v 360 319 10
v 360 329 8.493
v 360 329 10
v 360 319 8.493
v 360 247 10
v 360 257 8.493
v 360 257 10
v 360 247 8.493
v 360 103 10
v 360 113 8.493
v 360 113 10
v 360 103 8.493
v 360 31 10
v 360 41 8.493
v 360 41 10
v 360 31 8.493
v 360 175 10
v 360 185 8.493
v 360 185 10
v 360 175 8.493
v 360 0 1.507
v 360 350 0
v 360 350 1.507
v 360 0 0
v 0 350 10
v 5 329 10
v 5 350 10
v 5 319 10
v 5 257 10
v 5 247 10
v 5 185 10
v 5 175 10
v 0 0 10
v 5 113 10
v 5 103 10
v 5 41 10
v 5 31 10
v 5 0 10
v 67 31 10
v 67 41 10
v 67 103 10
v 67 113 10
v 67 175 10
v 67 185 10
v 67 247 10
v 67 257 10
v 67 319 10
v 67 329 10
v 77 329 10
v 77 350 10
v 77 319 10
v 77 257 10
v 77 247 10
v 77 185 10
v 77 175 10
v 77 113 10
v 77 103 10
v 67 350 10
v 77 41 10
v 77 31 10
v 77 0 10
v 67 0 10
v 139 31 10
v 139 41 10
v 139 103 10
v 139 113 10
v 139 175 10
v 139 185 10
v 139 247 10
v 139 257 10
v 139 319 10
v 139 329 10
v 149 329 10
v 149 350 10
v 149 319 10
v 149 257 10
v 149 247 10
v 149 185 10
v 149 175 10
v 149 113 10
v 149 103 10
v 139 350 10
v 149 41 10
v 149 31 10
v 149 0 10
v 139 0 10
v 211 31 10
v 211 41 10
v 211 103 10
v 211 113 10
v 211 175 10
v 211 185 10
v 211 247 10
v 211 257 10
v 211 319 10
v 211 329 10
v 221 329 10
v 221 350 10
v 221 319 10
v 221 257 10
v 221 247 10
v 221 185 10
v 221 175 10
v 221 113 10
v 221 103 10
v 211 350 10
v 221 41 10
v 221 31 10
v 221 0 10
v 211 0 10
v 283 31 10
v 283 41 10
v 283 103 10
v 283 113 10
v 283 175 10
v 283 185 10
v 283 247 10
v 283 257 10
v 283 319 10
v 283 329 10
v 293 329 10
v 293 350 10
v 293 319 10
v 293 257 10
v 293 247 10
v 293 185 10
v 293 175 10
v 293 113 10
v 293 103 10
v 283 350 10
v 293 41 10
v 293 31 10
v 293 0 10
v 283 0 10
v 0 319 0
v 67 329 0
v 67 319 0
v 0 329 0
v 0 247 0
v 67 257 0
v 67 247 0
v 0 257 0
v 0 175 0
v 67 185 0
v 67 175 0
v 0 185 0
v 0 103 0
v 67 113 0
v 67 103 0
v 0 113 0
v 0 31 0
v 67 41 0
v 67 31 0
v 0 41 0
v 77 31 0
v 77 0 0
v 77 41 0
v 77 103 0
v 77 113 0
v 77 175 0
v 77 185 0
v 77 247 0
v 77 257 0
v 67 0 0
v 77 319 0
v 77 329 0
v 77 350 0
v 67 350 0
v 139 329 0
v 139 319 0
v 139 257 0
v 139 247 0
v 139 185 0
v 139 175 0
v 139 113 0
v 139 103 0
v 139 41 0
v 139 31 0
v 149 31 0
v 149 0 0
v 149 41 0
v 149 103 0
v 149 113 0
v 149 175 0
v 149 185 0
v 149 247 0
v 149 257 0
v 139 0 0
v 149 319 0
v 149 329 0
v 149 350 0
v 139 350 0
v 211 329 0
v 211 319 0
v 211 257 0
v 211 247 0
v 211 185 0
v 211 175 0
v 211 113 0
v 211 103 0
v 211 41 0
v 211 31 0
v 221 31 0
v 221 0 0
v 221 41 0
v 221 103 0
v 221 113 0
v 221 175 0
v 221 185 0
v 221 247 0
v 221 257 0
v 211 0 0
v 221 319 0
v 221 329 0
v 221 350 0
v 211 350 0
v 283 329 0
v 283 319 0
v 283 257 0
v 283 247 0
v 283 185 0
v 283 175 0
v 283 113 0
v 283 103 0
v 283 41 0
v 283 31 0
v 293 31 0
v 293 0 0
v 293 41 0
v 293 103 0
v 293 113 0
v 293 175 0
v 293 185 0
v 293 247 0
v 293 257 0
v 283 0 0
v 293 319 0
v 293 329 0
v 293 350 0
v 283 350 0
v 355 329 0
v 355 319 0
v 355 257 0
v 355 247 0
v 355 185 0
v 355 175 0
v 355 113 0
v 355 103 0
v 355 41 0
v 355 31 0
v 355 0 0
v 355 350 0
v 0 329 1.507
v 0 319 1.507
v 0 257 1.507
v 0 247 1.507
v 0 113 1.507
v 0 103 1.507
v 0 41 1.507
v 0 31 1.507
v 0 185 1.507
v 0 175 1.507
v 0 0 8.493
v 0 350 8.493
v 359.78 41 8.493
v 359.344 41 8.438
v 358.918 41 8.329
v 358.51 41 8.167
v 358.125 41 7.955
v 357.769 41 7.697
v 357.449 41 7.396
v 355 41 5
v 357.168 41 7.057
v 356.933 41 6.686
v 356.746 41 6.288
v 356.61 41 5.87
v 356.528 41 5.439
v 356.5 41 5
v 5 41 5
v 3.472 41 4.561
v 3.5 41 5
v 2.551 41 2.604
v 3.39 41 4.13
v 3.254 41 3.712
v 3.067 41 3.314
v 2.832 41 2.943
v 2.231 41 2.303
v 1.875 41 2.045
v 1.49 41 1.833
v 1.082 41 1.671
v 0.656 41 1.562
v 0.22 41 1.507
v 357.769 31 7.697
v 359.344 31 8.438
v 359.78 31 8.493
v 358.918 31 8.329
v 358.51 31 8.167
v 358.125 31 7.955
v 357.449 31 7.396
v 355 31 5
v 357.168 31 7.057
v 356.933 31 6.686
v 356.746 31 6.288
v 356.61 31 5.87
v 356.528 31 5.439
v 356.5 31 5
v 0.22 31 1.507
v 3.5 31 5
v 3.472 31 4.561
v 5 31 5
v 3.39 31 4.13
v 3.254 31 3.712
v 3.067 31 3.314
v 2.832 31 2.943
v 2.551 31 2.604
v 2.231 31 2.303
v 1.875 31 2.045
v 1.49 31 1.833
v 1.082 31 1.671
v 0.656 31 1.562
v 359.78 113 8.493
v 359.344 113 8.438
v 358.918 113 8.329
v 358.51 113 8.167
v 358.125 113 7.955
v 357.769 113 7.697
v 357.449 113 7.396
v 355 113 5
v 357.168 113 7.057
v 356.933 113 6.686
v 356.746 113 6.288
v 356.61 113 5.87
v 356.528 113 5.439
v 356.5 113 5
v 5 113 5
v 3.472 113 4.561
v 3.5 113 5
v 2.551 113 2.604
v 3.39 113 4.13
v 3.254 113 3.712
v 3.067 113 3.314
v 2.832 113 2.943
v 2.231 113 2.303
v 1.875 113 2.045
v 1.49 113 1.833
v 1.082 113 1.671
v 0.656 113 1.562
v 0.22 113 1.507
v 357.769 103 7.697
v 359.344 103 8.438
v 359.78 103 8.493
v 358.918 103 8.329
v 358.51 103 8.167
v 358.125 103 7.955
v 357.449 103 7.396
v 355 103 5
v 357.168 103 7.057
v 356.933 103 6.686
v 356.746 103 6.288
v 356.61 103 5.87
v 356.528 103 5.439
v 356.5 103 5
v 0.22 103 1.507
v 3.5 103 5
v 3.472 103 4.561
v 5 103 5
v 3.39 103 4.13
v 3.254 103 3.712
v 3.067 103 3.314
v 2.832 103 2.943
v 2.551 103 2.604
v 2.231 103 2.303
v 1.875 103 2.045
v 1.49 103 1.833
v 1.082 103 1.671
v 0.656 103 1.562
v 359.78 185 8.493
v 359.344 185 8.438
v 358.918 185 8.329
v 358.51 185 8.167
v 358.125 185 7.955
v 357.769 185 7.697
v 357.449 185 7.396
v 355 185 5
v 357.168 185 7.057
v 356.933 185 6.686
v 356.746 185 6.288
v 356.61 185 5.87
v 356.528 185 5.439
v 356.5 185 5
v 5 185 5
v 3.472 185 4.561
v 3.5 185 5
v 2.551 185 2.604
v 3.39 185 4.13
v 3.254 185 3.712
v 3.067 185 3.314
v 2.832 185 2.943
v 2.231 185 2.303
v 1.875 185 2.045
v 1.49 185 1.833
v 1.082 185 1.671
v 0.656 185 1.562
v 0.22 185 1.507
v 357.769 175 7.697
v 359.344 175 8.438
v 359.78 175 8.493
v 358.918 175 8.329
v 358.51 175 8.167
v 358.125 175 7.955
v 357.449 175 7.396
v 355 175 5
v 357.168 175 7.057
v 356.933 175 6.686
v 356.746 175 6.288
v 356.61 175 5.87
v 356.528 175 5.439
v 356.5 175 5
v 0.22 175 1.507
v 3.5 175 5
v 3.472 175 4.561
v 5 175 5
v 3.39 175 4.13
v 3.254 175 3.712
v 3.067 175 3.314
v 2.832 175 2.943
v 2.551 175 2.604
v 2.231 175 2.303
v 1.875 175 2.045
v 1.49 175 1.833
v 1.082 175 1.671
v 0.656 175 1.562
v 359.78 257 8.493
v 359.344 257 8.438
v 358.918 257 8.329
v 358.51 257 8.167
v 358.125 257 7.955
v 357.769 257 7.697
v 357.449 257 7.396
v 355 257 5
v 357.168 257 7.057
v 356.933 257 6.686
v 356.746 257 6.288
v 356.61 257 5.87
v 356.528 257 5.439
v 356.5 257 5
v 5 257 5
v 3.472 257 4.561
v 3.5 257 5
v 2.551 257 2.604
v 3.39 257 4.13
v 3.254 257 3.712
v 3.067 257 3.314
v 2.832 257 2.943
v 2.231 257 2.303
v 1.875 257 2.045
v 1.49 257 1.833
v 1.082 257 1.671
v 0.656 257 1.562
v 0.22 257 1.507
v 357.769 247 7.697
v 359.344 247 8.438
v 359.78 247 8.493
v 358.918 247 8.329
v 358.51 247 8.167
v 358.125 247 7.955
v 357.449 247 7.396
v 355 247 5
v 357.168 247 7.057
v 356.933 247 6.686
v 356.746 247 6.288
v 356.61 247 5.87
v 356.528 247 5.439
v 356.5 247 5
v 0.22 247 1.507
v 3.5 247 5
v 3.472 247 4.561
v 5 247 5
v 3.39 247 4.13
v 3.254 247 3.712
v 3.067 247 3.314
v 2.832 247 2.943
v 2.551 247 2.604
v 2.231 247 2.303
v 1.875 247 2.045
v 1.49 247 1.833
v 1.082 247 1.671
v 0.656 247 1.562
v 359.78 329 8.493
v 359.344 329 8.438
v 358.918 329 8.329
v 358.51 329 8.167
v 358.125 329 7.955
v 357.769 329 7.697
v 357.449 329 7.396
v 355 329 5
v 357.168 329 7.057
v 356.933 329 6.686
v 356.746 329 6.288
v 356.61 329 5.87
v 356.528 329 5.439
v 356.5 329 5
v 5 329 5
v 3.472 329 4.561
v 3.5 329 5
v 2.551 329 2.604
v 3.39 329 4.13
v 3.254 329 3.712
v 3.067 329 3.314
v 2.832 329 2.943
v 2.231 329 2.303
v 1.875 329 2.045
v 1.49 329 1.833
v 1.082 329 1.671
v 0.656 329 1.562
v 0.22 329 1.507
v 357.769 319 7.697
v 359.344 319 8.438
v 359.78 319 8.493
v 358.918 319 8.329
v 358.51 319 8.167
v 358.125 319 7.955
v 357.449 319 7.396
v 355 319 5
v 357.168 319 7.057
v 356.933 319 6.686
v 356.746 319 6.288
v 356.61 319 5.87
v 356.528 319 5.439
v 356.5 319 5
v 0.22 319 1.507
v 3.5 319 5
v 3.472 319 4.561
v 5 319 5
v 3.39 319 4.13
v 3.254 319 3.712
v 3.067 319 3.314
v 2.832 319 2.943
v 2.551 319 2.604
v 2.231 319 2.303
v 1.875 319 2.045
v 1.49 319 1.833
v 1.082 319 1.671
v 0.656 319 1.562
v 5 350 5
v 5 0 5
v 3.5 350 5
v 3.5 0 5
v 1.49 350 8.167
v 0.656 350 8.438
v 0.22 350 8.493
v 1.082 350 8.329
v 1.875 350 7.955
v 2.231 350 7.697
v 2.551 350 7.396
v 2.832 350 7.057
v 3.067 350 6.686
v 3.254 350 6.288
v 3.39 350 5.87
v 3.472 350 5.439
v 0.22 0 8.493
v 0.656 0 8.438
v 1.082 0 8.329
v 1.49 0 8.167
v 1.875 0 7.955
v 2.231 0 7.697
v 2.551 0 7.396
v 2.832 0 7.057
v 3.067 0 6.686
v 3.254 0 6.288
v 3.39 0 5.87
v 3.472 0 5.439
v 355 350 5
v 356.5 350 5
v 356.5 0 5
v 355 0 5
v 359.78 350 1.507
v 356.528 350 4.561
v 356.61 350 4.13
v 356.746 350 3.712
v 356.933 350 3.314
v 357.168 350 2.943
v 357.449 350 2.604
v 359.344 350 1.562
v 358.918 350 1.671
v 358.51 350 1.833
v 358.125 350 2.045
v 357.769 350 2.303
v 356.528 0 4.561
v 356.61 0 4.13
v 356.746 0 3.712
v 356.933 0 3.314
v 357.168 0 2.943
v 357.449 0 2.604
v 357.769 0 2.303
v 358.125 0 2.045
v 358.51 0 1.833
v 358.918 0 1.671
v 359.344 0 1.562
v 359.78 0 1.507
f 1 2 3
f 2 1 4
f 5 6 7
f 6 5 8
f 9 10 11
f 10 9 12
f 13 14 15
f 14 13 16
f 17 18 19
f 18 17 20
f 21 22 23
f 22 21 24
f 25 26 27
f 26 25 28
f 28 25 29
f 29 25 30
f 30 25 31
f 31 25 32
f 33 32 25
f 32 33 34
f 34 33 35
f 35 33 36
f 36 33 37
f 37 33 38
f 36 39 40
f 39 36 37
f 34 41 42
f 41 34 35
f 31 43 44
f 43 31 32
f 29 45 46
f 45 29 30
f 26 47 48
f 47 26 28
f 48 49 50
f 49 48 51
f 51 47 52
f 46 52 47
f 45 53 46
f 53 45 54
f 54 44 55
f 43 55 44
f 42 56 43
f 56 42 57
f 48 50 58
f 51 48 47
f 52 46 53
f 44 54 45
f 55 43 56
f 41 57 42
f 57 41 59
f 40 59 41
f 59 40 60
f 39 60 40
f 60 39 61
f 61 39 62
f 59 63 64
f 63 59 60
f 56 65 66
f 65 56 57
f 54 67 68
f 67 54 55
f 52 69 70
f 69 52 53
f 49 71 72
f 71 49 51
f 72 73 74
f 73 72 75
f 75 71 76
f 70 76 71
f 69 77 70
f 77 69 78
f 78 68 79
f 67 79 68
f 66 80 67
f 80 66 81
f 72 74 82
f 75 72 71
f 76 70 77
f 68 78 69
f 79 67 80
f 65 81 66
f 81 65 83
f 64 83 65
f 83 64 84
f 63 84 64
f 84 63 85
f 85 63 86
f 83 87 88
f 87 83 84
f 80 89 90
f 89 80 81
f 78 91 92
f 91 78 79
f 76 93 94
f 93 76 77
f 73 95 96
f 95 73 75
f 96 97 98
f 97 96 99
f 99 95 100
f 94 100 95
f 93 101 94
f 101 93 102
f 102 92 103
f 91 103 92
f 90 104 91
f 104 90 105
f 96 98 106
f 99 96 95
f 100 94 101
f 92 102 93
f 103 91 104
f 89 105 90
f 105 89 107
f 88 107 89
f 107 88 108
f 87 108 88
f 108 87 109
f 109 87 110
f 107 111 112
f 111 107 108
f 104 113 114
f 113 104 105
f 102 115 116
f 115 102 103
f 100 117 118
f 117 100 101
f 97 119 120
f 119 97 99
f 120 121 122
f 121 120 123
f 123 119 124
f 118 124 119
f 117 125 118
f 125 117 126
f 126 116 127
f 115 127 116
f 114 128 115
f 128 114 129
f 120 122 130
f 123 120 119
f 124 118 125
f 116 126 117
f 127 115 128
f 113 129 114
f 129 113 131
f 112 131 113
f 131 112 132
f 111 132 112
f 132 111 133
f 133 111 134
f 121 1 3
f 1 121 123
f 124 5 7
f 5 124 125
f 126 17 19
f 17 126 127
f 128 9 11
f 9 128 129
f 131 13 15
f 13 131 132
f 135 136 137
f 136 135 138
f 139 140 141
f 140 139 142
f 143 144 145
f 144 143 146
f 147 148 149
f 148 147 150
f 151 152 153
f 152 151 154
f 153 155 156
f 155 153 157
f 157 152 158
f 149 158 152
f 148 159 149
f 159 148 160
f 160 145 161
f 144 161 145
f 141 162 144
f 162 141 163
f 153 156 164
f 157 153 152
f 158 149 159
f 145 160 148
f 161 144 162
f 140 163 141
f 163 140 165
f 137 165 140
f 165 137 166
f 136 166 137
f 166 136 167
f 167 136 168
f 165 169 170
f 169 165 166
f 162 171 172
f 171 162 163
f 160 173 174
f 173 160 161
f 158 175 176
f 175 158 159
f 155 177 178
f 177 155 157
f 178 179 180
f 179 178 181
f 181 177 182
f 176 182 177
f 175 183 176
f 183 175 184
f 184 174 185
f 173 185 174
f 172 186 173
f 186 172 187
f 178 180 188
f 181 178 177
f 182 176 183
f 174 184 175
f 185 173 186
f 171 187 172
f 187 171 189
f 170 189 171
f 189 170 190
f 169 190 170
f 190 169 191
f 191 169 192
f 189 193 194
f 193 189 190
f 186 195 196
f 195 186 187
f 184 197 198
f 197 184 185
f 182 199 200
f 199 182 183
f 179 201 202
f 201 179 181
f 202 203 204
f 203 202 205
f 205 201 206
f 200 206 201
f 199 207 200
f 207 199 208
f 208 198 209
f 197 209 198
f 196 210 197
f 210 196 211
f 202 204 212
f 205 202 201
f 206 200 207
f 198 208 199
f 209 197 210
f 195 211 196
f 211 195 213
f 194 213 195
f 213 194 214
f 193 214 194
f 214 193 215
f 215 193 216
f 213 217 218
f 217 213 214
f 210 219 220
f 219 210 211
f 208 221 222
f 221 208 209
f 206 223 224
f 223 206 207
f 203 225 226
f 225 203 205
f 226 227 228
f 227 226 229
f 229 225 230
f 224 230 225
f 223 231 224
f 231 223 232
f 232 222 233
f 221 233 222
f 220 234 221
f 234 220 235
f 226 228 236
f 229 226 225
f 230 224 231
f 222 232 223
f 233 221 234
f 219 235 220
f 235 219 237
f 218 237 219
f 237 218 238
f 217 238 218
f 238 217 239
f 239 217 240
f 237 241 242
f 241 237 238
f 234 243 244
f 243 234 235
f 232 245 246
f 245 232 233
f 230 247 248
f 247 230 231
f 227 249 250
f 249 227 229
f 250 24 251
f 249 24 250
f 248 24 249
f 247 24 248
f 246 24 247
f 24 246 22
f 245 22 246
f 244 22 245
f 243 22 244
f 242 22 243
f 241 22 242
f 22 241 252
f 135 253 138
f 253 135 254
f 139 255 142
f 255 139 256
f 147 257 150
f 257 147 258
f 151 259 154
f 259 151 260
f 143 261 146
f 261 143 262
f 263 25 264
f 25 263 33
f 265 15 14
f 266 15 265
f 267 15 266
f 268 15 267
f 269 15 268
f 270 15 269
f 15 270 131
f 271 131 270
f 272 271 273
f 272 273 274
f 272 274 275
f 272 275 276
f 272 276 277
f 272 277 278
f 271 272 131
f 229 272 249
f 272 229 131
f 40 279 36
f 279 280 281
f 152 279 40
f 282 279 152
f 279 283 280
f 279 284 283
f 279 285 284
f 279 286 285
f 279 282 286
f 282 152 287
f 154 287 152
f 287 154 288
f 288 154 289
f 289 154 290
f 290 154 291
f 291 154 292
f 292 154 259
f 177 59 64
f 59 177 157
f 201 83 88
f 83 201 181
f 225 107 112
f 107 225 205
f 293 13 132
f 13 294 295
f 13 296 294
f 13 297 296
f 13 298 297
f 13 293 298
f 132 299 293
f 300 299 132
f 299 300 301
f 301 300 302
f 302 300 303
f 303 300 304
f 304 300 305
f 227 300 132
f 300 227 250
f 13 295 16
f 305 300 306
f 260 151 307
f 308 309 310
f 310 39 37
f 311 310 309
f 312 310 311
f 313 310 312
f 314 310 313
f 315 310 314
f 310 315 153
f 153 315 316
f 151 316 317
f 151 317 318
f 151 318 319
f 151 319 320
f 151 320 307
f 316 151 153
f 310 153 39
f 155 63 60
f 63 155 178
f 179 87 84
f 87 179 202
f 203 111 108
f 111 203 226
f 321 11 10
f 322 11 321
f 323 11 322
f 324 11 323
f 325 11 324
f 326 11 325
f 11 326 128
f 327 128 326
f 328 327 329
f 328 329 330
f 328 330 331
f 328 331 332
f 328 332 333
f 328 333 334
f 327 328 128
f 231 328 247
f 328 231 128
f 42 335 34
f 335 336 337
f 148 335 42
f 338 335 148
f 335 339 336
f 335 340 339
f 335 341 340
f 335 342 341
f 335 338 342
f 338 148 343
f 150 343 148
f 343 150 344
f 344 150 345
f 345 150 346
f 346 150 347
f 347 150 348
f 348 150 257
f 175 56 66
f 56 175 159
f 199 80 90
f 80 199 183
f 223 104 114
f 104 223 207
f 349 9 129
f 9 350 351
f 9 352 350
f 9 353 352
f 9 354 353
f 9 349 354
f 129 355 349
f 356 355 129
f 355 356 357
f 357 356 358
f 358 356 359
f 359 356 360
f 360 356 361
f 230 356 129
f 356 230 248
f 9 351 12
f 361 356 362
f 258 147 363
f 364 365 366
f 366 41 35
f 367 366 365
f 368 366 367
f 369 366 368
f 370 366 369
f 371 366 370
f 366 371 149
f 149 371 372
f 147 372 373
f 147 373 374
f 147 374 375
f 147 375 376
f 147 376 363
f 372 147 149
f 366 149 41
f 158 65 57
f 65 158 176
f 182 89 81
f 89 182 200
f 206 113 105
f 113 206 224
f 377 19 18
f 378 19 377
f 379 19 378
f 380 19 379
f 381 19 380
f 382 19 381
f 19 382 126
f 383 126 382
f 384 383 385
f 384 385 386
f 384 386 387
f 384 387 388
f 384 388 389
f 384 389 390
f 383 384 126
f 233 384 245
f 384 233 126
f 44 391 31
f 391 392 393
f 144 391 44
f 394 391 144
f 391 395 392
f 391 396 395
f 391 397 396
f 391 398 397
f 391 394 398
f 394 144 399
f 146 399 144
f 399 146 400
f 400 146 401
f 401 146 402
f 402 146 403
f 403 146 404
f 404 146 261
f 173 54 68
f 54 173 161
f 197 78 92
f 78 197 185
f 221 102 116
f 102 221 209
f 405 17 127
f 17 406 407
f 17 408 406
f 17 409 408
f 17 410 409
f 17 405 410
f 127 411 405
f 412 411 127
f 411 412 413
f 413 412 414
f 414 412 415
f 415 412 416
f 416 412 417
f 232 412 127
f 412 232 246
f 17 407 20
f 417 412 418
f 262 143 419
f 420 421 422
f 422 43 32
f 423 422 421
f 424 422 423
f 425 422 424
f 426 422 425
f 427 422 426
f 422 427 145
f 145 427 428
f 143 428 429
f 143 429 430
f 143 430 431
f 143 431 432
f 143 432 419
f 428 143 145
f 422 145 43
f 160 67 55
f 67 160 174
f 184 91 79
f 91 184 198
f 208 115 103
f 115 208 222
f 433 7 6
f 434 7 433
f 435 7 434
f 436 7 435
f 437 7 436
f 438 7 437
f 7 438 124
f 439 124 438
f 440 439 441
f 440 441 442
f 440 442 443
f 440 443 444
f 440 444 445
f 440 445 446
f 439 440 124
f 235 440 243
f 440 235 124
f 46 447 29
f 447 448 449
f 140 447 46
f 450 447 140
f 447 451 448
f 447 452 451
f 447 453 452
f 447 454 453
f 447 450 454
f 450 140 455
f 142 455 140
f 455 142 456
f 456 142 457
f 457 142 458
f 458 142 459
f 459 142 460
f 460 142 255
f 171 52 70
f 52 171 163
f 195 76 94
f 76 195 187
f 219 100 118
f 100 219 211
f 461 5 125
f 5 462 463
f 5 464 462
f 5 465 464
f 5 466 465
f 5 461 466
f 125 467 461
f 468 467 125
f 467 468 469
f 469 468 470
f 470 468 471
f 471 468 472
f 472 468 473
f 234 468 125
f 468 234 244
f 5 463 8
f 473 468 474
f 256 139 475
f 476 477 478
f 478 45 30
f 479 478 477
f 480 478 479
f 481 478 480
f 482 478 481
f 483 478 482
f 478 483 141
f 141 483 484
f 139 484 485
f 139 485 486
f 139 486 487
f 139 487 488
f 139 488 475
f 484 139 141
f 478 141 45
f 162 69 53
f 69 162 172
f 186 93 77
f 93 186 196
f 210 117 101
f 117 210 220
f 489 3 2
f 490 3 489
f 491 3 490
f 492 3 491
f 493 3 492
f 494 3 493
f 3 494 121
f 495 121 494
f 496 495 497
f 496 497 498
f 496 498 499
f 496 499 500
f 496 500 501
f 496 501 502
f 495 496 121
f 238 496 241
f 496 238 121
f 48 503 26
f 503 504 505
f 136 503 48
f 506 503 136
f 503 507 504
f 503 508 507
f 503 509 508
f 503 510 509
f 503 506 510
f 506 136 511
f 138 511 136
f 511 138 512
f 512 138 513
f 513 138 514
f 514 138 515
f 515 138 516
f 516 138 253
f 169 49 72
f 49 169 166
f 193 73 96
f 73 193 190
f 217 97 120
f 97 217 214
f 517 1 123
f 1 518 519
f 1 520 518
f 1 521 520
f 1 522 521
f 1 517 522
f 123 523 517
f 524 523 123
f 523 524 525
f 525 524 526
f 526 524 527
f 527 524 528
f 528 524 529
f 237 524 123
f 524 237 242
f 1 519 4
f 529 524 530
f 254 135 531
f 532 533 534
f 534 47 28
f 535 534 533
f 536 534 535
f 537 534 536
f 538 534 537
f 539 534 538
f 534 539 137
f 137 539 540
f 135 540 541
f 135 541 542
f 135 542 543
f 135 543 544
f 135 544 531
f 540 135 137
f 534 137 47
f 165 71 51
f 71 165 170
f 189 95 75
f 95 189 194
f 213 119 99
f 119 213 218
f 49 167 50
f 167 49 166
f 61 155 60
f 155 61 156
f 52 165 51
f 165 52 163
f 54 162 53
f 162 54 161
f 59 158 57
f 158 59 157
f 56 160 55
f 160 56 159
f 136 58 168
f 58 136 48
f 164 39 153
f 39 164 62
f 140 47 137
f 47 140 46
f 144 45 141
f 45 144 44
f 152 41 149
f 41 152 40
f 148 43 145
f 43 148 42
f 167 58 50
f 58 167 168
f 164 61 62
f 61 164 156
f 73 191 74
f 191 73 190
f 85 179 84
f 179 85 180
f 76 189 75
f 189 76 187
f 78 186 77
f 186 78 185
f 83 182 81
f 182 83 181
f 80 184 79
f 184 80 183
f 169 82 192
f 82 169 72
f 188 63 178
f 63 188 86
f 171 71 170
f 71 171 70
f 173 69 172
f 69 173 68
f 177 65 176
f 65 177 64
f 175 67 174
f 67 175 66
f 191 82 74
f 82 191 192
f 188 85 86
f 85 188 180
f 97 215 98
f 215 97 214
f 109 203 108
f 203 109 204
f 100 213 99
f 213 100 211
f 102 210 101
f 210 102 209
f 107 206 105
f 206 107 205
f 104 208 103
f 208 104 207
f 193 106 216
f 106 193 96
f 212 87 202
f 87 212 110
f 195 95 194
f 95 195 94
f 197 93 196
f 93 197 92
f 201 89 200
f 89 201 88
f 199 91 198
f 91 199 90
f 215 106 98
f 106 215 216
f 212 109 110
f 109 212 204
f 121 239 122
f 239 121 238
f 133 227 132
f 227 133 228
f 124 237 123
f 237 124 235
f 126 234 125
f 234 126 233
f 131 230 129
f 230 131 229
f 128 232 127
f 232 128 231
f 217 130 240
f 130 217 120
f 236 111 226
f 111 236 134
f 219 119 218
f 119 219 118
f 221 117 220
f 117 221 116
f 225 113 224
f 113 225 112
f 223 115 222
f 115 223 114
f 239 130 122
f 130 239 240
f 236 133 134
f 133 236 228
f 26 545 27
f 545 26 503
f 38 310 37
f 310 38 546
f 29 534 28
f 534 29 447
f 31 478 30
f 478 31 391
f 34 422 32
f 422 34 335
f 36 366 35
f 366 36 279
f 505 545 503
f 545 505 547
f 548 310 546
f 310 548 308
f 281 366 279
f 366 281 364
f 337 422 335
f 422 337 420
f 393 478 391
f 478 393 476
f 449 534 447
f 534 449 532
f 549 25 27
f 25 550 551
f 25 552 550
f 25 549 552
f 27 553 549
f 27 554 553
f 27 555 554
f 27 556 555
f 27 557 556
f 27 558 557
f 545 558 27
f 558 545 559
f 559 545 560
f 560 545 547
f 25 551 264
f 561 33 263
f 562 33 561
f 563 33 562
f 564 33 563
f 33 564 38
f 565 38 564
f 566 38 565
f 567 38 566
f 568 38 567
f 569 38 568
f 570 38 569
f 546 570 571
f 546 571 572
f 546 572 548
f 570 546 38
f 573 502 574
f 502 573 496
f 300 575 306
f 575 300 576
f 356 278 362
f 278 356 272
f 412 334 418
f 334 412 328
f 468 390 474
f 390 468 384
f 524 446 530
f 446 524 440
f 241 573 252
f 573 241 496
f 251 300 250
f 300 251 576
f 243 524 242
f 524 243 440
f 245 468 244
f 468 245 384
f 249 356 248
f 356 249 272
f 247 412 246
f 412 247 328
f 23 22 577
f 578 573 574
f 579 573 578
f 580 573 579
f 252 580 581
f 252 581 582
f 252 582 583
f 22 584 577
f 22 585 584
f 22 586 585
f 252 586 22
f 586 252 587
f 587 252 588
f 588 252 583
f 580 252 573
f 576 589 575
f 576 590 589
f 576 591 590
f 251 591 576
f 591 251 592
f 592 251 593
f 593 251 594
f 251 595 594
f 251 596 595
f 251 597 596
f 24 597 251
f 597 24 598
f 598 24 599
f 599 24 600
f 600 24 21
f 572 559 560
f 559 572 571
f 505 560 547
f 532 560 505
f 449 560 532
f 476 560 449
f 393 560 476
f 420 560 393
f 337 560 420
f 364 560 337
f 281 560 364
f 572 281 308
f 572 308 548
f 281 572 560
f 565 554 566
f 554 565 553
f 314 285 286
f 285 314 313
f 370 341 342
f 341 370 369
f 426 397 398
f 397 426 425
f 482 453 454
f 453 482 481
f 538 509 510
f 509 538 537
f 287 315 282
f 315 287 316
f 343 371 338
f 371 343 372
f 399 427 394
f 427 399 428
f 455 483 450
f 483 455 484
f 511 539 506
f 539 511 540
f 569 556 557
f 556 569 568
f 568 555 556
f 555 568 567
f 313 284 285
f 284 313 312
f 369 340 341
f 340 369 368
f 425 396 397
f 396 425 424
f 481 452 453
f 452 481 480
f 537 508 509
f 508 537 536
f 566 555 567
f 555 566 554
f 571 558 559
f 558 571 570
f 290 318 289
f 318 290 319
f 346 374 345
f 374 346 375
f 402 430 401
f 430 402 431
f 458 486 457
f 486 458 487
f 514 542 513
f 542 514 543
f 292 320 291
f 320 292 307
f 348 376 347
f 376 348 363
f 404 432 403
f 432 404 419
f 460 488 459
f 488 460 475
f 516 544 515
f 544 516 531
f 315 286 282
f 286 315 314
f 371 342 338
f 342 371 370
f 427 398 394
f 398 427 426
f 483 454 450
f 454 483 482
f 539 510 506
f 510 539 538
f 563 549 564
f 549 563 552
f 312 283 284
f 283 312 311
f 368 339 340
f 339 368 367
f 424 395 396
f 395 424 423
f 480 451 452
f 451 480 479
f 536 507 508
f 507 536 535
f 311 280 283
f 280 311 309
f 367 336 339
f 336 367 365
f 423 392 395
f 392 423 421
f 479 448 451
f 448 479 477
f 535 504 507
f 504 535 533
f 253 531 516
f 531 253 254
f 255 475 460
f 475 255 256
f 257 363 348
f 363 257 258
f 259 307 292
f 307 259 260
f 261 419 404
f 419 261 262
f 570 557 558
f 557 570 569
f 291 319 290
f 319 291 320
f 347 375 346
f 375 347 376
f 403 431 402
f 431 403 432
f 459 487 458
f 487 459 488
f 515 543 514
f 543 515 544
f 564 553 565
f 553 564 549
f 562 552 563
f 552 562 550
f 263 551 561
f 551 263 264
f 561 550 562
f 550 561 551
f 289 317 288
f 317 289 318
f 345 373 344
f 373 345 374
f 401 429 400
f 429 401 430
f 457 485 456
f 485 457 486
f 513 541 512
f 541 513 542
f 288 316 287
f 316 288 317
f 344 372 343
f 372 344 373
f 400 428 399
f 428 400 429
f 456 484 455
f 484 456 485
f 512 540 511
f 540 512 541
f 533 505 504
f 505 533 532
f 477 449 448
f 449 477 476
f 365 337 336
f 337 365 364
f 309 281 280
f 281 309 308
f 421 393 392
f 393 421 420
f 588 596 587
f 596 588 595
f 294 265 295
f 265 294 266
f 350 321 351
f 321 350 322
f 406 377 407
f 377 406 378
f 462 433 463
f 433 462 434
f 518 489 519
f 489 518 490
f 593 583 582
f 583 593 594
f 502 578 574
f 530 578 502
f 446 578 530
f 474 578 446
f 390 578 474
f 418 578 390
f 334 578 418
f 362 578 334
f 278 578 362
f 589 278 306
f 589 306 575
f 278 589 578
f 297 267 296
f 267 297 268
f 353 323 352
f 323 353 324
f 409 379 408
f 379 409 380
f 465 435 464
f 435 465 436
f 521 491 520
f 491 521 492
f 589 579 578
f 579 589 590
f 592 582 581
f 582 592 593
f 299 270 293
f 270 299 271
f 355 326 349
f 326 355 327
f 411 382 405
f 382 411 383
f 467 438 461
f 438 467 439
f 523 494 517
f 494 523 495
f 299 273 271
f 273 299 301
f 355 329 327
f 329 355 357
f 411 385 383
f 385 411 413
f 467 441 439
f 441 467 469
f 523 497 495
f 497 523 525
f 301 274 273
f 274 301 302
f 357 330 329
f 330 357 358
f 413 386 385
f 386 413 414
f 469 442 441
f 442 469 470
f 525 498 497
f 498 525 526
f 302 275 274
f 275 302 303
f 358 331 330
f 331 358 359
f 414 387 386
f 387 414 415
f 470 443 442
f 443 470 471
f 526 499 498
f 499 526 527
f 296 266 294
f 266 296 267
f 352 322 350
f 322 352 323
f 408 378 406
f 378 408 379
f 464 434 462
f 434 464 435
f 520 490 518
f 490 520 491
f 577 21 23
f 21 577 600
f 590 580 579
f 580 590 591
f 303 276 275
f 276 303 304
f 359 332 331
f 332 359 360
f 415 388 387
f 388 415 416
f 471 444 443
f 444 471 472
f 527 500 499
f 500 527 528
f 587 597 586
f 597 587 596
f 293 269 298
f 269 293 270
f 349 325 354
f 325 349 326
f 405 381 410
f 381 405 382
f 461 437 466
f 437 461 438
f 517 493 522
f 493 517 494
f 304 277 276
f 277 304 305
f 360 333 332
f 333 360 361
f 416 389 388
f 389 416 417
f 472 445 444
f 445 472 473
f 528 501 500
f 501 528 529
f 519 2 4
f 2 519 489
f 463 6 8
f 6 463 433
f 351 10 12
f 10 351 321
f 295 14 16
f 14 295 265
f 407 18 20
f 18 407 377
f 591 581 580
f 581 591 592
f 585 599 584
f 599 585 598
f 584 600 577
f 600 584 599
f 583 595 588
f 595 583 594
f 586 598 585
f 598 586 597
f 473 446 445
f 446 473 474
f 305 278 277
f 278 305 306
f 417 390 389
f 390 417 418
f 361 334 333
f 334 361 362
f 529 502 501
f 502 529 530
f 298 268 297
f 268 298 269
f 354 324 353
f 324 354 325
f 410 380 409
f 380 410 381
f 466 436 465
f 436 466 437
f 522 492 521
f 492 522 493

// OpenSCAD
difference() {
union() {
translate([67,0,0]) cube([10,350,10]);
translate([139,0,0]) cube([10,350,10]);
translate([211,0,0]) cube([10,350,10]);
translate([283,0,0]) cube([10,350,10]);
h = [36,108,180,252,324];
for (c = h) {
translate([0, c-5,0]) cube([360,10,10]);
}
translate([0,0,5]) cube([5,350,5]);
translate([355,0,0]) cube([5,350,5]);
}
intersection() {
translate([0,175,5]) rotate([90,0,0]) cylinder(h=352, r=3.5, $fn=50, center=true);
translate([0,0,0]) cube([10,350,10]);
}
intersection() {
translate([360,175,5]) rotate([90,0,0]) cylinder(h=352, r=3.5, $fn=50, center=true);
translate([350,0,0]) cube([10,350,10]);
}
}
